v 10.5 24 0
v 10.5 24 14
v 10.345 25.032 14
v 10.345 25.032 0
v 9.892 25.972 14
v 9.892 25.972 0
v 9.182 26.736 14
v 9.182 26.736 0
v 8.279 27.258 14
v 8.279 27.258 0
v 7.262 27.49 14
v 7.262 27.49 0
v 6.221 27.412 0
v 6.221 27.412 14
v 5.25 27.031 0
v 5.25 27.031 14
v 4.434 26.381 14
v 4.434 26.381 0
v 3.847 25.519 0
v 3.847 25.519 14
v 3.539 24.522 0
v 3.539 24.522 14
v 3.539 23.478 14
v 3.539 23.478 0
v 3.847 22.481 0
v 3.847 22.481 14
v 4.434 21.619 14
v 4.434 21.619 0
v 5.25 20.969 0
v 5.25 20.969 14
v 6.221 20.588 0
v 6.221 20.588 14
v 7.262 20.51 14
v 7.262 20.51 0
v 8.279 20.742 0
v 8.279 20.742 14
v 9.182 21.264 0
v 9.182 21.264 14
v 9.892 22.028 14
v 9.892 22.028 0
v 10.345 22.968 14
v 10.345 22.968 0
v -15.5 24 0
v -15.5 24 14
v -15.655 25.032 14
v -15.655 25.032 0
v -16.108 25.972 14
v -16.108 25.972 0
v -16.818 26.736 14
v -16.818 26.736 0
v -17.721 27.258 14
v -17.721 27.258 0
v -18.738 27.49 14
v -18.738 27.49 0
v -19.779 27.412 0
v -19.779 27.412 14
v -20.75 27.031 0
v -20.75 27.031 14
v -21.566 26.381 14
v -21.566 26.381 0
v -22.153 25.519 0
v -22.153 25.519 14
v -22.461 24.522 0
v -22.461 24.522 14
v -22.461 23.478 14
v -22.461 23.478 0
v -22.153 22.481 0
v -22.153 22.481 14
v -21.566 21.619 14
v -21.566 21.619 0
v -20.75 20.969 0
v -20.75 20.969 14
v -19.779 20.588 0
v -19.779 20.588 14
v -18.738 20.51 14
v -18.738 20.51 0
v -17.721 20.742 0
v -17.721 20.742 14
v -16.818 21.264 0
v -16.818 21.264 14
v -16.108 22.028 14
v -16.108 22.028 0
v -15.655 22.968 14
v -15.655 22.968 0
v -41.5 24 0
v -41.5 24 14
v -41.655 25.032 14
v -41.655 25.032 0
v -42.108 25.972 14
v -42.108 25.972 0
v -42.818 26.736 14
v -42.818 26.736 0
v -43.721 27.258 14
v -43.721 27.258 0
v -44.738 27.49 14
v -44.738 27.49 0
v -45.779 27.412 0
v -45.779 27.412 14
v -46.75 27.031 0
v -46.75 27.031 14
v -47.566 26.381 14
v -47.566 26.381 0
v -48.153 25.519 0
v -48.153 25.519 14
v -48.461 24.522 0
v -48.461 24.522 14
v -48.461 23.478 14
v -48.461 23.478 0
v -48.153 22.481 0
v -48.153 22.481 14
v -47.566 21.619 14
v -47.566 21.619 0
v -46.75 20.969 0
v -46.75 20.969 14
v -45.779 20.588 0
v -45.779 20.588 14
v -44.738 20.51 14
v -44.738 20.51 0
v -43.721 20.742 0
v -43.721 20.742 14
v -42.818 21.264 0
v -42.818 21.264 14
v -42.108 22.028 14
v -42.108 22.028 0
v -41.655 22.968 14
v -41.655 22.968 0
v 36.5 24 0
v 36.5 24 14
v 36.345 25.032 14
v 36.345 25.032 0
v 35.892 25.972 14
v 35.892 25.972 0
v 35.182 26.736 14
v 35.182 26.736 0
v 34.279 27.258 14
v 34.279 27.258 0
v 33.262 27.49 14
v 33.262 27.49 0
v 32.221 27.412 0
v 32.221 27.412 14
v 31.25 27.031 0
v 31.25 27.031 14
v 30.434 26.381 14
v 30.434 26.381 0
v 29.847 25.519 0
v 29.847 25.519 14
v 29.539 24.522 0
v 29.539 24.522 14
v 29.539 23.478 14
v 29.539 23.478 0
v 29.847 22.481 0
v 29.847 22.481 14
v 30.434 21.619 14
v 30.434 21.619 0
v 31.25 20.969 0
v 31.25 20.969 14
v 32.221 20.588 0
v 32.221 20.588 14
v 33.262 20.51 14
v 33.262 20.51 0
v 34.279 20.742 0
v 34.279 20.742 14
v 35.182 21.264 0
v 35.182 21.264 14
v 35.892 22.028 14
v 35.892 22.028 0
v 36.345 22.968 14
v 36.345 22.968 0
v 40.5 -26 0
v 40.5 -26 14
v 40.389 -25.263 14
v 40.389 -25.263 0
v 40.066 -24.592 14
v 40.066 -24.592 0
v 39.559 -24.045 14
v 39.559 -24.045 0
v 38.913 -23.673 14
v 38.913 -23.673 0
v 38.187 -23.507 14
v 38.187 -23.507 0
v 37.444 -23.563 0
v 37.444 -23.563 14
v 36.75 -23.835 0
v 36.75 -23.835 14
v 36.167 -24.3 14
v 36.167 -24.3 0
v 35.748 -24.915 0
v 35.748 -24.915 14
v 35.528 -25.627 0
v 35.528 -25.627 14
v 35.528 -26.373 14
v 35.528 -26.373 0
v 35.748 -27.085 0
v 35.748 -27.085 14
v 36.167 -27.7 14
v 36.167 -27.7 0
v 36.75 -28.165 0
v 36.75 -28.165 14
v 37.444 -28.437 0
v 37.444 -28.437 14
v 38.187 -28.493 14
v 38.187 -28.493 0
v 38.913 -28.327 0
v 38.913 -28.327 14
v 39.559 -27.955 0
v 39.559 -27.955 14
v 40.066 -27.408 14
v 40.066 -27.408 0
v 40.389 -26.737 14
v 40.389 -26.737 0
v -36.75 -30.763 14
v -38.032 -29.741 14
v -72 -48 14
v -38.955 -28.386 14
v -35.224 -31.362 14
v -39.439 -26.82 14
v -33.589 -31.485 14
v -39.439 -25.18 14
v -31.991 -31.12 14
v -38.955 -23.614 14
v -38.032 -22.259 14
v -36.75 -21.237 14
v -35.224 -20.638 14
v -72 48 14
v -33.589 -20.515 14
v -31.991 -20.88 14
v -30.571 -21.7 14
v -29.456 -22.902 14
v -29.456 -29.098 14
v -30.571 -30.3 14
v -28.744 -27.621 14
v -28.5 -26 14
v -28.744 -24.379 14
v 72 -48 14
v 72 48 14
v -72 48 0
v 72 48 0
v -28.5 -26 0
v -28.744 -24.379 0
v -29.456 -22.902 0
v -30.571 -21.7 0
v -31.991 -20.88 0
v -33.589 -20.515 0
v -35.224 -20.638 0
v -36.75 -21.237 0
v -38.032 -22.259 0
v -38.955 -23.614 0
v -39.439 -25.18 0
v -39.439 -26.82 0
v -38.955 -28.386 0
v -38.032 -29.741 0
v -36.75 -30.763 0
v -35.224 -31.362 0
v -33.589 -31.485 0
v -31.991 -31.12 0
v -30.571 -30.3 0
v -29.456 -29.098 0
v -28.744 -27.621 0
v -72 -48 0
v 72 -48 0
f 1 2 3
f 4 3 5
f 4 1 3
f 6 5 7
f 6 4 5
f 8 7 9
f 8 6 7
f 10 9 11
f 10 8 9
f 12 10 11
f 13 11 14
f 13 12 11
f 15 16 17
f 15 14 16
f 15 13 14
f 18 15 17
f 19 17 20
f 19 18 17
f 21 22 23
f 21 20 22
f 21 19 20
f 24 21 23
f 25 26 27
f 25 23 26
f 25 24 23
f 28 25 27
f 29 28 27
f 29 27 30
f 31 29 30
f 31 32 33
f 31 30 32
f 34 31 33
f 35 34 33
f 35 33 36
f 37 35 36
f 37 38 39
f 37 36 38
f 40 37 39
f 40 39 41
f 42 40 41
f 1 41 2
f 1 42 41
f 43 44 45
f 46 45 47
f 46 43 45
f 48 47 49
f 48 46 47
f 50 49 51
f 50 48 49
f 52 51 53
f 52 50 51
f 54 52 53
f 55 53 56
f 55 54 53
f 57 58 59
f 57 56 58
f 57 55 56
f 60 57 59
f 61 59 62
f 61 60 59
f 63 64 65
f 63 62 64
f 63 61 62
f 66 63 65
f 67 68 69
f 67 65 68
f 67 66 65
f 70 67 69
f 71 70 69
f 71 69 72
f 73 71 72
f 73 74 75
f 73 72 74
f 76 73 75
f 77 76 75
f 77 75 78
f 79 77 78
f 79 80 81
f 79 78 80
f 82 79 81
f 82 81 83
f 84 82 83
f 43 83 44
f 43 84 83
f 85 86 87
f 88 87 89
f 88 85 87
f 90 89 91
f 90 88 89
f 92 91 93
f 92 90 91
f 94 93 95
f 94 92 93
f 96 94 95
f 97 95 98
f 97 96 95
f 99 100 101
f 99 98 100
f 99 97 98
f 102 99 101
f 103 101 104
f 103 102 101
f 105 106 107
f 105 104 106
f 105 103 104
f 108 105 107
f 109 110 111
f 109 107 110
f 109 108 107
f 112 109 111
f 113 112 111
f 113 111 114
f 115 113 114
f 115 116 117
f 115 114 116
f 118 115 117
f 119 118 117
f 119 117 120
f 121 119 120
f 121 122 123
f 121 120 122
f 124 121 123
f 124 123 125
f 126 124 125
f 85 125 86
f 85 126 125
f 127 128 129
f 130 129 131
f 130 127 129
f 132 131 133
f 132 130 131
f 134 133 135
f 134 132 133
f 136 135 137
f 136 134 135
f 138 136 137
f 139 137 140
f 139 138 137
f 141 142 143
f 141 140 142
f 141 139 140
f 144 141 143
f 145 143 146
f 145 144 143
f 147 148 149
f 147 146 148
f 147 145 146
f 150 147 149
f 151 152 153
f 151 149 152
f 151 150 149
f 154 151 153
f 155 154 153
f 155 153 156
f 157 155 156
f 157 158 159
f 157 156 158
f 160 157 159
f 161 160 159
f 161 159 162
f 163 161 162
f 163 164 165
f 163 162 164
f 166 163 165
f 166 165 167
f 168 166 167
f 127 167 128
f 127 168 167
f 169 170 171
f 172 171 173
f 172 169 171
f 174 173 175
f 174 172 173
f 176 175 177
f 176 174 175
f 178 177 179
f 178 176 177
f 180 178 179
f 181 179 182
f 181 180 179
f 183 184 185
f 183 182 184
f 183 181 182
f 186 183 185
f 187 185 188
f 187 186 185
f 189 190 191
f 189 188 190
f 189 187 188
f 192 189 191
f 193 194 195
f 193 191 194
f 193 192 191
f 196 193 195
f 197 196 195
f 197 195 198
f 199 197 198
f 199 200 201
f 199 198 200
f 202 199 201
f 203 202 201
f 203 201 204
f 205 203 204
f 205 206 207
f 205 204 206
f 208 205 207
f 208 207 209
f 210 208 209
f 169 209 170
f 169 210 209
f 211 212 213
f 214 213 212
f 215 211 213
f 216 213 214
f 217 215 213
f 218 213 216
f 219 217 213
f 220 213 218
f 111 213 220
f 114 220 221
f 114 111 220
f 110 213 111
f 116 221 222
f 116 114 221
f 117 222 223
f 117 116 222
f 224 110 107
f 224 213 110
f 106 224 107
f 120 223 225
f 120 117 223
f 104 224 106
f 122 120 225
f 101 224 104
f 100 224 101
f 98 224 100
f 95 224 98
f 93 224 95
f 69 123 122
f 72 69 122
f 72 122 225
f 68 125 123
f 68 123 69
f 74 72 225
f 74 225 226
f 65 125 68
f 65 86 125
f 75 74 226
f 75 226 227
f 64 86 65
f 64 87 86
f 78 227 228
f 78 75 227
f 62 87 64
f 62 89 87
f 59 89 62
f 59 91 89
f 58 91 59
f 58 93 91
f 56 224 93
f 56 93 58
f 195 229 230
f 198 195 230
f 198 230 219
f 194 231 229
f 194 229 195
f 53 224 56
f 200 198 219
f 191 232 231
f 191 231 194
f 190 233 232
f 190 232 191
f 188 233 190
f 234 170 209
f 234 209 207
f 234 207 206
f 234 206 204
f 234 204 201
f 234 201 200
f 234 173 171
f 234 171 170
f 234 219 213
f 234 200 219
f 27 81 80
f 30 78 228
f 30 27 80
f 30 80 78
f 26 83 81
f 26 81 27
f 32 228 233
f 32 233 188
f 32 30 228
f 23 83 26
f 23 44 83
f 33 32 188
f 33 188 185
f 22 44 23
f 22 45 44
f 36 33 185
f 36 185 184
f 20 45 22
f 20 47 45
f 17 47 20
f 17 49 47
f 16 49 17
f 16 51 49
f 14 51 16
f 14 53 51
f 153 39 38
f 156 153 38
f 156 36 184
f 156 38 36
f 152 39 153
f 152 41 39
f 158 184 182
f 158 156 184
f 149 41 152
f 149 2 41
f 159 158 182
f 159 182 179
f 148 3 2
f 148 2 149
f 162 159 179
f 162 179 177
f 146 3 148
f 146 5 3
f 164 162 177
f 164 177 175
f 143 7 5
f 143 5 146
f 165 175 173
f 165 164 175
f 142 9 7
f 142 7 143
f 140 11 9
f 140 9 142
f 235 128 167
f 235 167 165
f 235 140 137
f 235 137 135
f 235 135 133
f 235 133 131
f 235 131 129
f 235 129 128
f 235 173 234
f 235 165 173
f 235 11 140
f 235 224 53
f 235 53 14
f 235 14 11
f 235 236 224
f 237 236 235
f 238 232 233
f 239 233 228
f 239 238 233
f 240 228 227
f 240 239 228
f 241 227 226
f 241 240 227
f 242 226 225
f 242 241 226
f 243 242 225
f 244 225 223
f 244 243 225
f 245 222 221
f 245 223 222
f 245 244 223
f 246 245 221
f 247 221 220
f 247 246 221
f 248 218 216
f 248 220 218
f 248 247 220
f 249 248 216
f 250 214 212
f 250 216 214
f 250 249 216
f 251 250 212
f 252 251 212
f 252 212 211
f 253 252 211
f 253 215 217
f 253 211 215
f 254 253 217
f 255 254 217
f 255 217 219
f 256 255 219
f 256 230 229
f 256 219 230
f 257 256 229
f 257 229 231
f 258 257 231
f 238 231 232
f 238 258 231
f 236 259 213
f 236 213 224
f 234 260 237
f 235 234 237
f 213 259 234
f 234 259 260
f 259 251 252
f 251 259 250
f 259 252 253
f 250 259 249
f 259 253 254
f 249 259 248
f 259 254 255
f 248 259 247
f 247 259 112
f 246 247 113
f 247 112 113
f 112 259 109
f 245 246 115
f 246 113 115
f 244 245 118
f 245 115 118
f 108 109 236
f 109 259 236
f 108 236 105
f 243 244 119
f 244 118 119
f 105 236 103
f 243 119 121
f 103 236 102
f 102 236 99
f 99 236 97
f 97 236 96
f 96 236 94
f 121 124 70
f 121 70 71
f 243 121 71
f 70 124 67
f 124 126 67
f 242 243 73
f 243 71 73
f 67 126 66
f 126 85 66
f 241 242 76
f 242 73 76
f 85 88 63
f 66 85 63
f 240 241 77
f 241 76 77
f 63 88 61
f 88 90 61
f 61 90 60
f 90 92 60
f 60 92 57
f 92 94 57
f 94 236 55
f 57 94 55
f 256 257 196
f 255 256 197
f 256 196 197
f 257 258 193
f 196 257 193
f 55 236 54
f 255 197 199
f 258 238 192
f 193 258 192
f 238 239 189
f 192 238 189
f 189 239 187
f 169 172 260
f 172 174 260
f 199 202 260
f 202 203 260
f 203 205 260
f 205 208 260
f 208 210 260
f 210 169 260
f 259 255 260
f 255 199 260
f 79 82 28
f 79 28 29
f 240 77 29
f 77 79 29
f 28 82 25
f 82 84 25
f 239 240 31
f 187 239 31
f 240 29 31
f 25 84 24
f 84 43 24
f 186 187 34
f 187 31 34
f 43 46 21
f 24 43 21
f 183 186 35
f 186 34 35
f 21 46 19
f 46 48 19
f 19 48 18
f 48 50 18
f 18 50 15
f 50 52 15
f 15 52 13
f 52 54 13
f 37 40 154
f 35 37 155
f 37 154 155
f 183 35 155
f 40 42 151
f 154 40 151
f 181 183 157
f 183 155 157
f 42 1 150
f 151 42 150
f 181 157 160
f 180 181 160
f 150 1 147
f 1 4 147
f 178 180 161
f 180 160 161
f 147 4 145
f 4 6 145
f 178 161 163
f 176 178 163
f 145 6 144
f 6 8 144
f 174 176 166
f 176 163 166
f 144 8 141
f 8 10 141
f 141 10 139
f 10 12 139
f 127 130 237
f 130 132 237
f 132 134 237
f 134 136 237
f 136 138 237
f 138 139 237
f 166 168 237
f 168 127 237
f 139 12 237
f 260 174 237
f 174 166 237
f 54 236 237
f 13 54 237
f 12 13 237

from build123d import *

# Parameters (mm, degrees)
SKETCH_1_W             = 144
SKETCH_1_H             = 96
EXTRUDE_237_DEPTH      = 14
SKETCH_3_R             = 3.5
CUT_EXTRUDE_A_DEPTH    = 88.658428003
PATTERN_LINEAR_2_COUNT = 4
PATTERN_LINEAR_2_PITCH = 26
SKETCH_4_R             = 5.5
CUT_EXTRUDE_B_DEPTH    = 88.658428003
SKETCH_5_R             = 2.5
CUT_EXTRUDE_C_DEPTH    = 88.658428003


with BuildPart() as part:
    # 草图1 → Extrude 237 (new body)
    with BuildSketch(Plane.XY):
        Rectangle(SKETCH_1_W, SKETCH_1_H)
    extrude(amount=EXTRUDE_237_DEPTH)

    # 草图3 → 孔A (cut, through all)
    with BuildSketch(Plane.XY):
        with Locations((-45, 24)):
            Circle(SKETCH_3_R)
    cut_extrude_a = extrude(amount=CUT_EXTRUDE_A_DEPTH, mode=Mode.SUBTRACT)

    # 阵列(线性)2: 孔A ×4
    with Locations(*[(i * PATTERN_LINEAR_2_PITCH, 0, 0) for i in range(1, PATTERN_LINEAR_2_COUNT)]):
        add(cut_extrude_a, mode=Mode.SUBTRACT)

    # 草图4 → 孔B (cut, through all)
    with BuildSketch(Plane.XY):
        with Locations((-34, -26)):
            Circle(SKETCH_4_R)
    extrude(amount=CUT_EXTRUDE_B_DEPTH, mode=Mode.SUBTRACT)

    # 草图5 → 孔C (cut, through all)
    with BuildSketch(Plane.XY):
        with Locations((38, -26)):
            Circle(SKETCH_5_R)
    extrude(amount=CUT_EXTRUDE_C_DEPTH, mode=Mode.SUBTRACT)


solid = part.part
